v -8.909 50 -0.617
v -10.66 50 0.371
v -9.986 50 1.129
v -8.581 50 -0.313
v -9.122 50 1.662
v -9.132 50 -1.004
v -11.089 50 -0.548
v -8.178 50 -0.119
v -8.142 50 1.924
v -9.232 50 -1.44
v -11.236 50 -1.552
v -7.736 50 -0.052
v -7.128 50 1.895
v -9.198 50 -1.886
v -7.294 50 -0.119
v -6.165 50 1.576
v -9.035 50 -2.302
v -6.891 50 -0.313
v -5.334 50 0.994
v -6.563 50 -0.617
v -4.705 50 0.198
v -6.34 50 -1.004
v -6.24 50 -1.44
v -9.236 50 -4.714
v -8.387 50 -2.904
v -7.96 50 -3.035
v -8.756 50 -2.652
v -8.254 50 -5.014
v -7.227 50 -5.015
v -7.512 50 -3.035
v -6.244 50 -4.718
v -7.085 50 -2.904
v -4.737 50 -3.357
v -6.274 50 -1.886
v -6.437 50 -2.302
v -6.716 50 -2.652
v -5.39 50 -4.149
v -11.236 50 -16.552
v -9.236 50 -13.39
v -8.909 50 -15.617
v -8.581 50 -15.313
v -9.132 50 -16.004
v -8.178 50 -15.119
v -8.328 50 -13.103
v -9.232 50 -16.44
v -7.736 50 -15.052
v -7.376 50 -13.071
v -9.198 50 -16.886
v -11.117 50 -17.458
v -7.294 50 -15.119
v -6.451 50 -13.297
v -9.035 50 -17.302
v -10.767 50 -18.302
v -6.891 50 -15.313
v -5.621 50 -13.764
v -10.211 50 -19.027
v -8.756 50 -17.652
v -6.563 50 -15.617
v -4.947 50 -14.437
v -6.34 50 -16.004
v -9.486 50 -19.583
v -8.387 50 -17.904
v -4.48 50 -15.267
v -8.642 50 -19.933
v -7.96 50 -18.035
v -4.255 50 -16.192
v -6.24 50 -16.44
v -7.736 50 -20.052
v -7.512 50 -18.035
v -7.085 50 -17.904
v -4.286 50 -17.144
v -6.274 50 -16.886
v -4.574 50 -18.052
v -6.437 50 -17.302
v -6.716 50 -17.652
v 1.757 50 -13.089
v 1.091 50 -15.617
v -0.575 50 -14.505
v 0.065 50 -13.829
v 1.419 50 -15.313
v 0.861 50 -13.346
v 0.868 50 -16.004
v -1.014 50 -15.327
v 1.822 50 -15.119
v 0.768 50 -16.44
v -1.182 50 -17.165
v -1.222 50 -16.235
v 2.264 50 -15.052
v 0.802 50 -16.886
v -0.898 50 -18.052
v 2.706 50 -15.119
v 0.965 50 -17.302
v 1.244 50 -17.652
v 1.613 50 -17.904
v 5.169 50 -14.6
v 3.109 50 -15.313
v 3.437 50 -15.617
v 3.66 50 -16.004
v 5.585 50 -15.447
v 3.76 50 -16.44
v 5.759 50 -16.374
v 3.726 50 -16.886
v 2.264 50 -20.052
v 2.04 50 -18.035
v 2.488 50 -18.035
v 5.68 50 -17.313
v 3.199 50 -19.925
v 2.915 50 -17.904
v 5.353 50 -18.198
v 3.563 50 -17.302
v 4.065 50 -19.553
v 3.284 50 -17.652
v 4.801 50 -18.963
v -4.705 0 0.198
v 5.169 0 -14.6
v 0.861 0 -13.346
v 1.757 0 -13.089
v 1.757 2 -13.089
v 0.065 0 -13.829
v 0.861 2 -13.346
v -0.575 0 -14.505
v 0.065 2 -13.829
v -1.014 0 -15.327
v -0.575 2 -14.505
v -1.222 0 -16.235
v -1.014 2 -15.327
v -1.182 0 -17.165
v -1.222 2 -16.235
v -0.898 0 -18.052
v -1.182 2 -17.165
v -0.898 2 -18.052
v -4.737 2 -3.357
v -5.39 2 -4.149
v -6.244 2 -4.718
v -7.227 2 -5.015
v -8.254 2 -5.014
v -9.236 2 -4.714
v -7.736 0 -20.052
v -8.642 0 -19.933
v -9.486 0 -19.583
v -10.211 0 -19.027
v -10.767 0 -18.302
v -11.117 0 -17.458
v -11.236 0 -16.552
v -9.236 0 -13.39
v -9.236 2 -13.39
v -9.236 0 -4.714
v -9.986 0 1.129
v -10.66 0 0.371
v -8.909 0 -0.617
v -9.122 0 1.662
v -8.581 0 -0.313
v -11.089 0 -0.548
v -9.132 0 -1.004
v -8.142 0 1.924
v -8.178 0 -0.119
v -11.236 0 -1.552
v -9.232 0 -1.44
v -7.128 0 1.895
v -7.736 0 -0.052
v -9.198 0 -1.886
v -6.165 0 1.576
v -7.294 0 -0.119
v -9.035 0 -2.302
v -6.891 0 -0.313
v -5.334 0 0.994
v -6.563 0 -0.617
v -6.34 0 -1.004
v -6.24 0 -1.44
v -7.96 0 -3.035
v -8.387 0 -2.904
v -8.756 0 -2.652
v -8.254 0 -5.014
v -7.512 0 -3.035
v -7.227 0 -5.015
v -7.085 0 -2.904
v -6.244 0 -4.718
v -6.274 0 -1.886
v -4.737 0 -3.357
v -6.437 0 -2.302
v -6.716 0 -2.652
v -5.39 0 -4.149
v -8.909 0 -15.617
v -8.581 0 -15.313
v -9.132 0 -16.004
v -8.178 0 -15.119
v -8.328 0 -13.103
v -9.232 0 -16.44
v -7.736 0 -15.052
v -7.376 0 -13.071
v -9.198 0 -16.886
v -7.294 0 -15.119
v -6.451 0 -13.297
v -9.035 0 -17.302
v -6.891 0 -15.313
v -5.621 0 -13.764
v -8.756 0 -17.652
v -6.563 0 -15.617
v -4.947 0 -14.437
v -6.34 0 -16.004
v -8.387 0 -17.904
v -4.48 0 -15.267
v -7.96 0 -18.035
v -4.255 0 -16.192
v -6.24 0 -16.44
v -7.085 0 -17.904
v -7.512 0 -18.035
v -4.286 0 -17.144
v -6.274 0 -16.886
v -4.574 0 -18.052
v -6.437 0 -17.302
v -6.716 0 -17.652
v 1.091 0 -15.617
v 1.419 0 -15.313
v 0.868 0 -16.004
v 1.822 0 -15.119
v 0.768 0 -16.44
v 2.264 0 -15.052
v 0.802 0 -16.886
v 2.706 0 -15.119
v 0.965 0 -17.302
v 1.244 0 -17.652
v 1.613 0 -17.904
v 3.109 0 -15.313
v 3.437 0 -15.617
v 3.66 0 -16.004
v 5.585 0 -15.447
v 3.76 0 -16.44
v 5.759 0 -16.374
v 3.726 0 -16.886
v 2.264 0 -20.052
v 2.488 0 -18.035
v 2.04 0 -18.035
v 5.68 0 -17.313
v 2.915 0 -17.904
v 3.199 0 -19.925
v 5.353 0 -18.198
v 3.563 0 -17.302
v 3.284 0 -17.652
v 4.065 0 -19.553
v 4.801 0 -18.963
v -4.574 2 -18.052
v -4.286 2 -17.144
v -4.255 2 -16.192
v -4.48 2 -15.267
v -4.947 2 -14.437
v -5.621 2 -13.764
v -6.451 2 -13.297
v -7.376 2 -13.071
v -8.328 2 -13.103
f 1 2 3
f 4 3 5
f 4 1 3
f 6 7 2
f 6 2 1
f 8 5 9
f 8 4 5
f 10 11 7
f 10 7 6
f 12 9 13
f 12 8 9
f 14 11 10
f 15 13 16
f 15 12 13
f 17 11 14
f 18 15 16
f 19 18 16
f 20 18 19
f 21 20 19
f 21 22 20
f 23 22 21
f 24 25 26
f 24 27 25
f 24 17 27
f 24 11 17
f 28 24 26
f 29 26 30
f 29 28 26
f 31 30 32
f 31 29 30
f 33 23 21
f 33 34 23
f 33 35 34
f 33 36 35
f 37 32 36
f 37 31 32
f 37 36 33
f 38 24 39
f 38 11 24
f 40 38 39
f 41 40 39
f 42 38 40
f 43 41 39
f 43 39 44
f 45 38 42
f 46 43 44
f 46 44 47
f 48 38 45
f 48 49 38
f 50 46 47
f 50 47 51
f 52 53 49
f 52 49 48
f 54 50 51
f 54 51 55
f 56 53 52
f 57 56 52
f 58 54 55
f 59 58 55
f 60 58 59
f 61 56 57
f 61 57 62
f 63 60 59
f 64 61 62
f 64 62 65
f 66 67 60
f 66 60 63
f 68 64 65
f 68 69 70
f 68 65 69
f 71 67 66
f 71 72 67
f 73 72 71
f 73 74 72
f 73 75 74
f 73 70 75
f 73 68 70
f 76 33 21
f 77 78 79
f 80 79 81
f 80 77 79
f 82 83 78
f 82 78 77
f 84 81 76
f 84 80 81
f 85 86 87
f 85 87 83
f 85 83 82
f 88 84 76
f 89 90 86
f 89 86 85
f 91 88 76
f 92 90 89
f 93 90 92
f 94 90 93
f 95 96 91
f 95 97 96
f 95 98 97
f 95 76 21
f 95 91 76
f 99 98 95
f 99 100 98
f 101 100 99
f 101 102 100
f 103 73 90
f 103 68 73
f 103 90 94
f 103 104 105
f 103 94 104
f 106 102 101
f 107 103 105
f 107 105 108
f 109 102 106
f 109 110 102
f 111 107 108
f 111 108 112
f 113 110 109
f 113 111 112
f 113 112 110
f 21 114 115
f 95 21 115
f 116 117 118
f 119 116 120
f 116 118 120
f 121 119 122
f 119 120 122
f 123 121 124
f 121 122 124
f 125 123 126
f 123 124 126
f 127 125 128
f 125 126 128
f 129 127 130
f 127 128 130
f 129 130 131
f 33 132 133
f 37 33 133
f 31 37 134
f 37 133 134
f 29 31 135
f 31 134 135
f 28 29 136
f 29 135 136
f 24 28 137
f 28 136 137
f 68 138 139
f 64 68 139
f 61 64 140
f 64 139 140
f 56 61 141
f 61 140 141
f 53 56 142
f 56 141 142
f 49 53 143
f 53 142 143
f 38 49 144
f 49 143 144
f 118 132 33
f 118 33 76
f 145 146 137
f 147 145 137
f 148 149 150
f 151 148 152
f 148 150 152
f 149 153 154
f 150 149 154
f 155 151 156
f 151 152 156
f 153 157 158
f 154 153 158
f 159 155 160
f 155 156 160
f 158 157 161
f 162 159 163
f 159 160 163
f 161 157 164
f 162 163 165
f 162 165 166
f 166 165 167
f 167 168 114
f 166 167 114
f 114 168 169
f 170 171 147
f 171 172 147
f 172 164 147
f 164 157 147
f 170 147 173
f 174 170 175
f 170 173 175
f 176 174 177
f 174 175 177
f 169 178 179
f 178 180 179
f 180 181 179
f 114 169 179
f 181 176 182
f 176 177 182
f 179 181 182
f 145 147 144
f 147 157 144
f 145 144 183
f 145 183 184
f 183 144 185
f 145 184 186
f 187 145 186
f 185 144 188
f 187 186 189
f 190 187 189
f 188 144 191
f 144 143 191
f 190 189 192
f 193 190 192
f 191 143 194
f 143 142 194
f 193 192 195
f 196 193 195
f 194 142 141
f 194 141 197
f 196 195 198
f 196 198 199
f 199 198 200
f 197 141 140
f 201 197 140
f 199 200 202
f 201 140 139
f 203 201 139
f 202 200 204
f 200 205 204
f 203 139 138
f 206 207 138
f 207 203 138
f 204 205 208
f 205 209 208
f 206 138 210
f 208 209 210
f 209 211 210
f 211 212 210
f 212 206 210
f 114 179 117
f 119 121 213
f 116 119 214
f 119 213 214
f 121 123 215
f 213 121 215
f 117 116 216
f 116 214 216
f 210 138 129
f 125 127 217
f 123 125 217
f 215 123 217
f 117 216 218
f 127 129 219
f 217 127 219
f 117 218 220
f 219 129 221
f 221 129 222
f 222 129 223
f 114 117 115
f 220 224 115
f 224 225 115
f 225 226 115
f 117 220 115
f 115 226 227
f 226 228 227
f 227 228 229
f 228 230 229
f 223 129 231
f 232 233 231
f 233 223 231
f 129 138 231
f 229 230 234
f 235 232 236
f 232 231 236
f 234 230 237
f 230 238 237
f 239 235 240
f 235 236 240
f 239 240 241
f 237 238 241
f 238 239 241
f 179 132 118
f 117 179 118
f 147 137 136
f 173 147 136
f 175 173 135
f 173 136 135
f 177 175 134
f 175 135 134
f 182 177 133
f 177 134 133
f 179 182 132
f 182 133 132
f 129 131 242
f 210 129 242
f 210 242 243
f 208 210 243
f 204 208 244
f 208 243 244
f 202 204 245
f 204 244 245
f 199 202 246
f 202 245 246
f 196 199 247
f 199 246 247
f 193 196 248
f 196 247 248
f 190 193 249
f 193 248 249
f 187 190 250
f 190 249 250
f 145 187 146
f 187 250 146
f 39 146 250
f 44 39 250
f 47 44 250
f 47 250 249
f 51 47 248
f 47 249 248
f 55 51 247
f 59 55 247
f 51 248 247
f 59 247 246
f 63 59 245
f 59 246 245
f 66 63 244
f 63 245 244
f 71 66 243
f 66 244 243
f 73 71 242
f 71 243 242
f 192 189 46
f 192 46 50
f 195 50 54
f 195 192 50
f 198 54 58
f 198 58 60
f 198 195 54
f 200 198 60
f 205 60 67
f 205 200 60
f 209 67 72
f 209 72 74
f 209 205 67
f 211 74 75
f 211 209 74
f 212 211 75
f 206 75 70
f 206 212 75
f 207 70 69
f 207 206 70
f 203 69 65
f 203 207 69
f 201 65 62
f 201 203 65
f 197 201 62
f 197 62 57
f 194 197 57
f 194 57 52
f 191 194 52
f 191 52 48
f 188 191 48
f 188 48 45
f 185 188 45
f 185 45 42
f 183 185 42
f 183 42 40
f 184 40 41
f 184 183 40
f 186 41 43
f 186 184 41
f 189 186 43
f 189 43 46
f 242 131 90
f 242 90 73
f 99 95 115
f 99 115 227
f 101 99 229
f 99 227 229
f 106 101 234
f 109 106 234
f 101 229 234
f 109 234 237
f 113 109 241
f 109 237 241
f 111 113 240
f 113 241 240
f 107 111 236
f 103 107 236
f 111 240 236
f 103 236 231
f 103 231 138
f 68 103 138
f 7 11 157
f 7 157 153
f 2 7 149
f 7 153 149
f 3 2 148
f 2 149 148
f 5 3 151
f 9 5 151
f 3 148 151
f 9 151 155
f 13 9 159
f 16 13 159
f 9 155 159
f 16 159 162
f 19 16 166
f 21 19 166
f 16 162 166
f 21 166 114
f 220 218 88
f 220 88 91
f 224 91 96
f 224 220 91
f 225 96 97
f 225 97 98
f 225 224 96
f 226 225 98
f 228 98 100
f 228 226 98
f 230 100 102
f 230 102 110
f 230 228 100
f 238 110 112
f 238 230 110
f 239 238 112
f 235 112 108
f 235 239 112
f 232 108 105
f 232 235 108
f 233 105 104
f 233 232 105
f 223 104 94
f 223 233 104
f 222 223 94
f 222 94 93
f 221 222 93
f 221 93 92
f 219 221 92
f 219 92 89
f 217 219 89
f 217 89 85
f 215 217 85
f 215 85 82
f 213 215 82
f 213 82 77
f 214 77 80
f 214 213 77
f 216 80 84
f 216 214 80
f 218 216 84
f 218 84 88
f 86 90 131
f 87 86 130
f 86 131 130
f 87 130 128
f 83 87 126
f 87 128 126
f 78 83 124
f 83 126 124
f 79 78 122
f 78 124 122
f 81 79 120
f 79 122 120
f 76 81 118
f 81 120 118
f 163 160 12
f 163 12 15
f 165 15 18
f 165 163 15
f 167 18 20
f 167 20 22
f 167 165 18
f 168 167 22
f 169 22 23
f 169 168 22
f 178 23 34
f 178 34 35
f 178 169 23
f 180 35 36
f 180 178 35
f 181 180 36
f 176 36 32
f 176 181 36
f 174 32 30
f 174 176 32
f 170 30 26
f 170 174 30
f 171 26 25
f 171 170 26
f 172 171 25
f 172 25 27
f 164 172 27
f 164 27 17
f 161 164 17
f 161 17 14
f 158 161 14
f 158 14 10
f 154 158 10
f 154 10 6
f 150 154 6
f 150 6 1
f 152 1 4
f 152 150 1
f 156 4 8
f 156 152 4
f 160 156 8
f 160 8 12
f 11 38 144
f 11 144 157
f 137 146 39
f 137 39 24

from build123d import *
from build123d.topology import SkipClean

# Parameters (mm, degrees)
SKETCH1_R           = 1.5
BOSS_EXTRUDE1_DEPTH = 50
SHELL2_T            = -2
CUT_EXTRUDE1_DEPTH  = 54.219702176


with BuildPart() as part:
    # Sketch1 → Boss-Extrude1 (new body)
    with BuildSketch(Plane(origin=(0, 0, 0), x_dir=(1, 0, 0), z_dir=(0, 1, 0))):
        with BuildLine():
            Line((-11.236028054, 16.552141364), (-11.236028054, 1.552141364))
            ThreePointArc((-11.236028054, 1.552141364), (-8.641894712, -1.828599028), (-4.704939141, -0.197858636))
            Line((-4.704939141, -0.197858636), (5.169075286, 14.600123285))
            ThreePointArc((5.169075286, 14.600123285), (5.352827986, 18.19803576), (2.263971946, 20.052141364))
            Line((2.263971946, 20.052141364), (-7.736028054, 20.052141364))
            ThreePointArc((-7.736028054, 20.052141364), (-10.210901788, 19.027015098), (-11.236028054, 16.552141364))
        make_face()
        with Locations(Location((-7.736028054, 16.552141364, 0), (0, 0, 270))):
            Circle(SKETCH1_R, mode=Mode.SUBTRACT)
        with Locations(Location((2.263971946, 16.552141364, 0), (0, 0, 270))):
            Circle(SKETCH1_R, mode=Mode.SUBTRACT)
        with Locations(Location((-7.736028054, 1.552141364, 0), (0, 0, 270))):
            Circle(SKETCH1_R, mode=Mode.SUBTRACT)
    extrude(amount=BOSS_EXTRUDE1_DEPTH)

    # Shell2
    shell2_openings = [part.faces().sort_by_distance(p)[0] for p in [
        (-4.434629852, 50, -10.910758817),
    ]]
    offset(amount=SHELL2_T, openings=shell2_openings)

    # Sketch2 → Cut-Extrude1 (cut, through all)
    with SkipClean():  # the faces are left unmerged after this step: merging them gives an invalid solid
        with BuildSketch(Plane(origin=(0, 2, 0), x_dir=(1, 0, 0), z_dir=(0, 1, 0))):
            with BuildLine():
                Line((-9.236028054, 13.389863704), (-9.236028054, 4.714419024))
                ThreePointArc((-9.236028054, 4.714419024), (-6.72499281, 4.90293347), (-4.737288861, 3.357013451))
                Line((-4.737288861, 3.357013451), (1.75650333, 13.089125972))
                ThreePointArc((1.75650333, 13.089125972), (-0.822229583, 14.901274888), (-0.898305714, 18.052141364))
                Line((-0.898305714, 18.052141364), (-4.573750394, 18.052141364))
                ThreePointArc((-4.573750394, 18.052141364), (-5.26115432, 14.07726763), (-9.236028054, 13.389863704))
            make_face()
        extrude(amount=-CUT_EXTRUDE1_DEPTH, mode=Mode.SUBTRACT)


solid = part.part
